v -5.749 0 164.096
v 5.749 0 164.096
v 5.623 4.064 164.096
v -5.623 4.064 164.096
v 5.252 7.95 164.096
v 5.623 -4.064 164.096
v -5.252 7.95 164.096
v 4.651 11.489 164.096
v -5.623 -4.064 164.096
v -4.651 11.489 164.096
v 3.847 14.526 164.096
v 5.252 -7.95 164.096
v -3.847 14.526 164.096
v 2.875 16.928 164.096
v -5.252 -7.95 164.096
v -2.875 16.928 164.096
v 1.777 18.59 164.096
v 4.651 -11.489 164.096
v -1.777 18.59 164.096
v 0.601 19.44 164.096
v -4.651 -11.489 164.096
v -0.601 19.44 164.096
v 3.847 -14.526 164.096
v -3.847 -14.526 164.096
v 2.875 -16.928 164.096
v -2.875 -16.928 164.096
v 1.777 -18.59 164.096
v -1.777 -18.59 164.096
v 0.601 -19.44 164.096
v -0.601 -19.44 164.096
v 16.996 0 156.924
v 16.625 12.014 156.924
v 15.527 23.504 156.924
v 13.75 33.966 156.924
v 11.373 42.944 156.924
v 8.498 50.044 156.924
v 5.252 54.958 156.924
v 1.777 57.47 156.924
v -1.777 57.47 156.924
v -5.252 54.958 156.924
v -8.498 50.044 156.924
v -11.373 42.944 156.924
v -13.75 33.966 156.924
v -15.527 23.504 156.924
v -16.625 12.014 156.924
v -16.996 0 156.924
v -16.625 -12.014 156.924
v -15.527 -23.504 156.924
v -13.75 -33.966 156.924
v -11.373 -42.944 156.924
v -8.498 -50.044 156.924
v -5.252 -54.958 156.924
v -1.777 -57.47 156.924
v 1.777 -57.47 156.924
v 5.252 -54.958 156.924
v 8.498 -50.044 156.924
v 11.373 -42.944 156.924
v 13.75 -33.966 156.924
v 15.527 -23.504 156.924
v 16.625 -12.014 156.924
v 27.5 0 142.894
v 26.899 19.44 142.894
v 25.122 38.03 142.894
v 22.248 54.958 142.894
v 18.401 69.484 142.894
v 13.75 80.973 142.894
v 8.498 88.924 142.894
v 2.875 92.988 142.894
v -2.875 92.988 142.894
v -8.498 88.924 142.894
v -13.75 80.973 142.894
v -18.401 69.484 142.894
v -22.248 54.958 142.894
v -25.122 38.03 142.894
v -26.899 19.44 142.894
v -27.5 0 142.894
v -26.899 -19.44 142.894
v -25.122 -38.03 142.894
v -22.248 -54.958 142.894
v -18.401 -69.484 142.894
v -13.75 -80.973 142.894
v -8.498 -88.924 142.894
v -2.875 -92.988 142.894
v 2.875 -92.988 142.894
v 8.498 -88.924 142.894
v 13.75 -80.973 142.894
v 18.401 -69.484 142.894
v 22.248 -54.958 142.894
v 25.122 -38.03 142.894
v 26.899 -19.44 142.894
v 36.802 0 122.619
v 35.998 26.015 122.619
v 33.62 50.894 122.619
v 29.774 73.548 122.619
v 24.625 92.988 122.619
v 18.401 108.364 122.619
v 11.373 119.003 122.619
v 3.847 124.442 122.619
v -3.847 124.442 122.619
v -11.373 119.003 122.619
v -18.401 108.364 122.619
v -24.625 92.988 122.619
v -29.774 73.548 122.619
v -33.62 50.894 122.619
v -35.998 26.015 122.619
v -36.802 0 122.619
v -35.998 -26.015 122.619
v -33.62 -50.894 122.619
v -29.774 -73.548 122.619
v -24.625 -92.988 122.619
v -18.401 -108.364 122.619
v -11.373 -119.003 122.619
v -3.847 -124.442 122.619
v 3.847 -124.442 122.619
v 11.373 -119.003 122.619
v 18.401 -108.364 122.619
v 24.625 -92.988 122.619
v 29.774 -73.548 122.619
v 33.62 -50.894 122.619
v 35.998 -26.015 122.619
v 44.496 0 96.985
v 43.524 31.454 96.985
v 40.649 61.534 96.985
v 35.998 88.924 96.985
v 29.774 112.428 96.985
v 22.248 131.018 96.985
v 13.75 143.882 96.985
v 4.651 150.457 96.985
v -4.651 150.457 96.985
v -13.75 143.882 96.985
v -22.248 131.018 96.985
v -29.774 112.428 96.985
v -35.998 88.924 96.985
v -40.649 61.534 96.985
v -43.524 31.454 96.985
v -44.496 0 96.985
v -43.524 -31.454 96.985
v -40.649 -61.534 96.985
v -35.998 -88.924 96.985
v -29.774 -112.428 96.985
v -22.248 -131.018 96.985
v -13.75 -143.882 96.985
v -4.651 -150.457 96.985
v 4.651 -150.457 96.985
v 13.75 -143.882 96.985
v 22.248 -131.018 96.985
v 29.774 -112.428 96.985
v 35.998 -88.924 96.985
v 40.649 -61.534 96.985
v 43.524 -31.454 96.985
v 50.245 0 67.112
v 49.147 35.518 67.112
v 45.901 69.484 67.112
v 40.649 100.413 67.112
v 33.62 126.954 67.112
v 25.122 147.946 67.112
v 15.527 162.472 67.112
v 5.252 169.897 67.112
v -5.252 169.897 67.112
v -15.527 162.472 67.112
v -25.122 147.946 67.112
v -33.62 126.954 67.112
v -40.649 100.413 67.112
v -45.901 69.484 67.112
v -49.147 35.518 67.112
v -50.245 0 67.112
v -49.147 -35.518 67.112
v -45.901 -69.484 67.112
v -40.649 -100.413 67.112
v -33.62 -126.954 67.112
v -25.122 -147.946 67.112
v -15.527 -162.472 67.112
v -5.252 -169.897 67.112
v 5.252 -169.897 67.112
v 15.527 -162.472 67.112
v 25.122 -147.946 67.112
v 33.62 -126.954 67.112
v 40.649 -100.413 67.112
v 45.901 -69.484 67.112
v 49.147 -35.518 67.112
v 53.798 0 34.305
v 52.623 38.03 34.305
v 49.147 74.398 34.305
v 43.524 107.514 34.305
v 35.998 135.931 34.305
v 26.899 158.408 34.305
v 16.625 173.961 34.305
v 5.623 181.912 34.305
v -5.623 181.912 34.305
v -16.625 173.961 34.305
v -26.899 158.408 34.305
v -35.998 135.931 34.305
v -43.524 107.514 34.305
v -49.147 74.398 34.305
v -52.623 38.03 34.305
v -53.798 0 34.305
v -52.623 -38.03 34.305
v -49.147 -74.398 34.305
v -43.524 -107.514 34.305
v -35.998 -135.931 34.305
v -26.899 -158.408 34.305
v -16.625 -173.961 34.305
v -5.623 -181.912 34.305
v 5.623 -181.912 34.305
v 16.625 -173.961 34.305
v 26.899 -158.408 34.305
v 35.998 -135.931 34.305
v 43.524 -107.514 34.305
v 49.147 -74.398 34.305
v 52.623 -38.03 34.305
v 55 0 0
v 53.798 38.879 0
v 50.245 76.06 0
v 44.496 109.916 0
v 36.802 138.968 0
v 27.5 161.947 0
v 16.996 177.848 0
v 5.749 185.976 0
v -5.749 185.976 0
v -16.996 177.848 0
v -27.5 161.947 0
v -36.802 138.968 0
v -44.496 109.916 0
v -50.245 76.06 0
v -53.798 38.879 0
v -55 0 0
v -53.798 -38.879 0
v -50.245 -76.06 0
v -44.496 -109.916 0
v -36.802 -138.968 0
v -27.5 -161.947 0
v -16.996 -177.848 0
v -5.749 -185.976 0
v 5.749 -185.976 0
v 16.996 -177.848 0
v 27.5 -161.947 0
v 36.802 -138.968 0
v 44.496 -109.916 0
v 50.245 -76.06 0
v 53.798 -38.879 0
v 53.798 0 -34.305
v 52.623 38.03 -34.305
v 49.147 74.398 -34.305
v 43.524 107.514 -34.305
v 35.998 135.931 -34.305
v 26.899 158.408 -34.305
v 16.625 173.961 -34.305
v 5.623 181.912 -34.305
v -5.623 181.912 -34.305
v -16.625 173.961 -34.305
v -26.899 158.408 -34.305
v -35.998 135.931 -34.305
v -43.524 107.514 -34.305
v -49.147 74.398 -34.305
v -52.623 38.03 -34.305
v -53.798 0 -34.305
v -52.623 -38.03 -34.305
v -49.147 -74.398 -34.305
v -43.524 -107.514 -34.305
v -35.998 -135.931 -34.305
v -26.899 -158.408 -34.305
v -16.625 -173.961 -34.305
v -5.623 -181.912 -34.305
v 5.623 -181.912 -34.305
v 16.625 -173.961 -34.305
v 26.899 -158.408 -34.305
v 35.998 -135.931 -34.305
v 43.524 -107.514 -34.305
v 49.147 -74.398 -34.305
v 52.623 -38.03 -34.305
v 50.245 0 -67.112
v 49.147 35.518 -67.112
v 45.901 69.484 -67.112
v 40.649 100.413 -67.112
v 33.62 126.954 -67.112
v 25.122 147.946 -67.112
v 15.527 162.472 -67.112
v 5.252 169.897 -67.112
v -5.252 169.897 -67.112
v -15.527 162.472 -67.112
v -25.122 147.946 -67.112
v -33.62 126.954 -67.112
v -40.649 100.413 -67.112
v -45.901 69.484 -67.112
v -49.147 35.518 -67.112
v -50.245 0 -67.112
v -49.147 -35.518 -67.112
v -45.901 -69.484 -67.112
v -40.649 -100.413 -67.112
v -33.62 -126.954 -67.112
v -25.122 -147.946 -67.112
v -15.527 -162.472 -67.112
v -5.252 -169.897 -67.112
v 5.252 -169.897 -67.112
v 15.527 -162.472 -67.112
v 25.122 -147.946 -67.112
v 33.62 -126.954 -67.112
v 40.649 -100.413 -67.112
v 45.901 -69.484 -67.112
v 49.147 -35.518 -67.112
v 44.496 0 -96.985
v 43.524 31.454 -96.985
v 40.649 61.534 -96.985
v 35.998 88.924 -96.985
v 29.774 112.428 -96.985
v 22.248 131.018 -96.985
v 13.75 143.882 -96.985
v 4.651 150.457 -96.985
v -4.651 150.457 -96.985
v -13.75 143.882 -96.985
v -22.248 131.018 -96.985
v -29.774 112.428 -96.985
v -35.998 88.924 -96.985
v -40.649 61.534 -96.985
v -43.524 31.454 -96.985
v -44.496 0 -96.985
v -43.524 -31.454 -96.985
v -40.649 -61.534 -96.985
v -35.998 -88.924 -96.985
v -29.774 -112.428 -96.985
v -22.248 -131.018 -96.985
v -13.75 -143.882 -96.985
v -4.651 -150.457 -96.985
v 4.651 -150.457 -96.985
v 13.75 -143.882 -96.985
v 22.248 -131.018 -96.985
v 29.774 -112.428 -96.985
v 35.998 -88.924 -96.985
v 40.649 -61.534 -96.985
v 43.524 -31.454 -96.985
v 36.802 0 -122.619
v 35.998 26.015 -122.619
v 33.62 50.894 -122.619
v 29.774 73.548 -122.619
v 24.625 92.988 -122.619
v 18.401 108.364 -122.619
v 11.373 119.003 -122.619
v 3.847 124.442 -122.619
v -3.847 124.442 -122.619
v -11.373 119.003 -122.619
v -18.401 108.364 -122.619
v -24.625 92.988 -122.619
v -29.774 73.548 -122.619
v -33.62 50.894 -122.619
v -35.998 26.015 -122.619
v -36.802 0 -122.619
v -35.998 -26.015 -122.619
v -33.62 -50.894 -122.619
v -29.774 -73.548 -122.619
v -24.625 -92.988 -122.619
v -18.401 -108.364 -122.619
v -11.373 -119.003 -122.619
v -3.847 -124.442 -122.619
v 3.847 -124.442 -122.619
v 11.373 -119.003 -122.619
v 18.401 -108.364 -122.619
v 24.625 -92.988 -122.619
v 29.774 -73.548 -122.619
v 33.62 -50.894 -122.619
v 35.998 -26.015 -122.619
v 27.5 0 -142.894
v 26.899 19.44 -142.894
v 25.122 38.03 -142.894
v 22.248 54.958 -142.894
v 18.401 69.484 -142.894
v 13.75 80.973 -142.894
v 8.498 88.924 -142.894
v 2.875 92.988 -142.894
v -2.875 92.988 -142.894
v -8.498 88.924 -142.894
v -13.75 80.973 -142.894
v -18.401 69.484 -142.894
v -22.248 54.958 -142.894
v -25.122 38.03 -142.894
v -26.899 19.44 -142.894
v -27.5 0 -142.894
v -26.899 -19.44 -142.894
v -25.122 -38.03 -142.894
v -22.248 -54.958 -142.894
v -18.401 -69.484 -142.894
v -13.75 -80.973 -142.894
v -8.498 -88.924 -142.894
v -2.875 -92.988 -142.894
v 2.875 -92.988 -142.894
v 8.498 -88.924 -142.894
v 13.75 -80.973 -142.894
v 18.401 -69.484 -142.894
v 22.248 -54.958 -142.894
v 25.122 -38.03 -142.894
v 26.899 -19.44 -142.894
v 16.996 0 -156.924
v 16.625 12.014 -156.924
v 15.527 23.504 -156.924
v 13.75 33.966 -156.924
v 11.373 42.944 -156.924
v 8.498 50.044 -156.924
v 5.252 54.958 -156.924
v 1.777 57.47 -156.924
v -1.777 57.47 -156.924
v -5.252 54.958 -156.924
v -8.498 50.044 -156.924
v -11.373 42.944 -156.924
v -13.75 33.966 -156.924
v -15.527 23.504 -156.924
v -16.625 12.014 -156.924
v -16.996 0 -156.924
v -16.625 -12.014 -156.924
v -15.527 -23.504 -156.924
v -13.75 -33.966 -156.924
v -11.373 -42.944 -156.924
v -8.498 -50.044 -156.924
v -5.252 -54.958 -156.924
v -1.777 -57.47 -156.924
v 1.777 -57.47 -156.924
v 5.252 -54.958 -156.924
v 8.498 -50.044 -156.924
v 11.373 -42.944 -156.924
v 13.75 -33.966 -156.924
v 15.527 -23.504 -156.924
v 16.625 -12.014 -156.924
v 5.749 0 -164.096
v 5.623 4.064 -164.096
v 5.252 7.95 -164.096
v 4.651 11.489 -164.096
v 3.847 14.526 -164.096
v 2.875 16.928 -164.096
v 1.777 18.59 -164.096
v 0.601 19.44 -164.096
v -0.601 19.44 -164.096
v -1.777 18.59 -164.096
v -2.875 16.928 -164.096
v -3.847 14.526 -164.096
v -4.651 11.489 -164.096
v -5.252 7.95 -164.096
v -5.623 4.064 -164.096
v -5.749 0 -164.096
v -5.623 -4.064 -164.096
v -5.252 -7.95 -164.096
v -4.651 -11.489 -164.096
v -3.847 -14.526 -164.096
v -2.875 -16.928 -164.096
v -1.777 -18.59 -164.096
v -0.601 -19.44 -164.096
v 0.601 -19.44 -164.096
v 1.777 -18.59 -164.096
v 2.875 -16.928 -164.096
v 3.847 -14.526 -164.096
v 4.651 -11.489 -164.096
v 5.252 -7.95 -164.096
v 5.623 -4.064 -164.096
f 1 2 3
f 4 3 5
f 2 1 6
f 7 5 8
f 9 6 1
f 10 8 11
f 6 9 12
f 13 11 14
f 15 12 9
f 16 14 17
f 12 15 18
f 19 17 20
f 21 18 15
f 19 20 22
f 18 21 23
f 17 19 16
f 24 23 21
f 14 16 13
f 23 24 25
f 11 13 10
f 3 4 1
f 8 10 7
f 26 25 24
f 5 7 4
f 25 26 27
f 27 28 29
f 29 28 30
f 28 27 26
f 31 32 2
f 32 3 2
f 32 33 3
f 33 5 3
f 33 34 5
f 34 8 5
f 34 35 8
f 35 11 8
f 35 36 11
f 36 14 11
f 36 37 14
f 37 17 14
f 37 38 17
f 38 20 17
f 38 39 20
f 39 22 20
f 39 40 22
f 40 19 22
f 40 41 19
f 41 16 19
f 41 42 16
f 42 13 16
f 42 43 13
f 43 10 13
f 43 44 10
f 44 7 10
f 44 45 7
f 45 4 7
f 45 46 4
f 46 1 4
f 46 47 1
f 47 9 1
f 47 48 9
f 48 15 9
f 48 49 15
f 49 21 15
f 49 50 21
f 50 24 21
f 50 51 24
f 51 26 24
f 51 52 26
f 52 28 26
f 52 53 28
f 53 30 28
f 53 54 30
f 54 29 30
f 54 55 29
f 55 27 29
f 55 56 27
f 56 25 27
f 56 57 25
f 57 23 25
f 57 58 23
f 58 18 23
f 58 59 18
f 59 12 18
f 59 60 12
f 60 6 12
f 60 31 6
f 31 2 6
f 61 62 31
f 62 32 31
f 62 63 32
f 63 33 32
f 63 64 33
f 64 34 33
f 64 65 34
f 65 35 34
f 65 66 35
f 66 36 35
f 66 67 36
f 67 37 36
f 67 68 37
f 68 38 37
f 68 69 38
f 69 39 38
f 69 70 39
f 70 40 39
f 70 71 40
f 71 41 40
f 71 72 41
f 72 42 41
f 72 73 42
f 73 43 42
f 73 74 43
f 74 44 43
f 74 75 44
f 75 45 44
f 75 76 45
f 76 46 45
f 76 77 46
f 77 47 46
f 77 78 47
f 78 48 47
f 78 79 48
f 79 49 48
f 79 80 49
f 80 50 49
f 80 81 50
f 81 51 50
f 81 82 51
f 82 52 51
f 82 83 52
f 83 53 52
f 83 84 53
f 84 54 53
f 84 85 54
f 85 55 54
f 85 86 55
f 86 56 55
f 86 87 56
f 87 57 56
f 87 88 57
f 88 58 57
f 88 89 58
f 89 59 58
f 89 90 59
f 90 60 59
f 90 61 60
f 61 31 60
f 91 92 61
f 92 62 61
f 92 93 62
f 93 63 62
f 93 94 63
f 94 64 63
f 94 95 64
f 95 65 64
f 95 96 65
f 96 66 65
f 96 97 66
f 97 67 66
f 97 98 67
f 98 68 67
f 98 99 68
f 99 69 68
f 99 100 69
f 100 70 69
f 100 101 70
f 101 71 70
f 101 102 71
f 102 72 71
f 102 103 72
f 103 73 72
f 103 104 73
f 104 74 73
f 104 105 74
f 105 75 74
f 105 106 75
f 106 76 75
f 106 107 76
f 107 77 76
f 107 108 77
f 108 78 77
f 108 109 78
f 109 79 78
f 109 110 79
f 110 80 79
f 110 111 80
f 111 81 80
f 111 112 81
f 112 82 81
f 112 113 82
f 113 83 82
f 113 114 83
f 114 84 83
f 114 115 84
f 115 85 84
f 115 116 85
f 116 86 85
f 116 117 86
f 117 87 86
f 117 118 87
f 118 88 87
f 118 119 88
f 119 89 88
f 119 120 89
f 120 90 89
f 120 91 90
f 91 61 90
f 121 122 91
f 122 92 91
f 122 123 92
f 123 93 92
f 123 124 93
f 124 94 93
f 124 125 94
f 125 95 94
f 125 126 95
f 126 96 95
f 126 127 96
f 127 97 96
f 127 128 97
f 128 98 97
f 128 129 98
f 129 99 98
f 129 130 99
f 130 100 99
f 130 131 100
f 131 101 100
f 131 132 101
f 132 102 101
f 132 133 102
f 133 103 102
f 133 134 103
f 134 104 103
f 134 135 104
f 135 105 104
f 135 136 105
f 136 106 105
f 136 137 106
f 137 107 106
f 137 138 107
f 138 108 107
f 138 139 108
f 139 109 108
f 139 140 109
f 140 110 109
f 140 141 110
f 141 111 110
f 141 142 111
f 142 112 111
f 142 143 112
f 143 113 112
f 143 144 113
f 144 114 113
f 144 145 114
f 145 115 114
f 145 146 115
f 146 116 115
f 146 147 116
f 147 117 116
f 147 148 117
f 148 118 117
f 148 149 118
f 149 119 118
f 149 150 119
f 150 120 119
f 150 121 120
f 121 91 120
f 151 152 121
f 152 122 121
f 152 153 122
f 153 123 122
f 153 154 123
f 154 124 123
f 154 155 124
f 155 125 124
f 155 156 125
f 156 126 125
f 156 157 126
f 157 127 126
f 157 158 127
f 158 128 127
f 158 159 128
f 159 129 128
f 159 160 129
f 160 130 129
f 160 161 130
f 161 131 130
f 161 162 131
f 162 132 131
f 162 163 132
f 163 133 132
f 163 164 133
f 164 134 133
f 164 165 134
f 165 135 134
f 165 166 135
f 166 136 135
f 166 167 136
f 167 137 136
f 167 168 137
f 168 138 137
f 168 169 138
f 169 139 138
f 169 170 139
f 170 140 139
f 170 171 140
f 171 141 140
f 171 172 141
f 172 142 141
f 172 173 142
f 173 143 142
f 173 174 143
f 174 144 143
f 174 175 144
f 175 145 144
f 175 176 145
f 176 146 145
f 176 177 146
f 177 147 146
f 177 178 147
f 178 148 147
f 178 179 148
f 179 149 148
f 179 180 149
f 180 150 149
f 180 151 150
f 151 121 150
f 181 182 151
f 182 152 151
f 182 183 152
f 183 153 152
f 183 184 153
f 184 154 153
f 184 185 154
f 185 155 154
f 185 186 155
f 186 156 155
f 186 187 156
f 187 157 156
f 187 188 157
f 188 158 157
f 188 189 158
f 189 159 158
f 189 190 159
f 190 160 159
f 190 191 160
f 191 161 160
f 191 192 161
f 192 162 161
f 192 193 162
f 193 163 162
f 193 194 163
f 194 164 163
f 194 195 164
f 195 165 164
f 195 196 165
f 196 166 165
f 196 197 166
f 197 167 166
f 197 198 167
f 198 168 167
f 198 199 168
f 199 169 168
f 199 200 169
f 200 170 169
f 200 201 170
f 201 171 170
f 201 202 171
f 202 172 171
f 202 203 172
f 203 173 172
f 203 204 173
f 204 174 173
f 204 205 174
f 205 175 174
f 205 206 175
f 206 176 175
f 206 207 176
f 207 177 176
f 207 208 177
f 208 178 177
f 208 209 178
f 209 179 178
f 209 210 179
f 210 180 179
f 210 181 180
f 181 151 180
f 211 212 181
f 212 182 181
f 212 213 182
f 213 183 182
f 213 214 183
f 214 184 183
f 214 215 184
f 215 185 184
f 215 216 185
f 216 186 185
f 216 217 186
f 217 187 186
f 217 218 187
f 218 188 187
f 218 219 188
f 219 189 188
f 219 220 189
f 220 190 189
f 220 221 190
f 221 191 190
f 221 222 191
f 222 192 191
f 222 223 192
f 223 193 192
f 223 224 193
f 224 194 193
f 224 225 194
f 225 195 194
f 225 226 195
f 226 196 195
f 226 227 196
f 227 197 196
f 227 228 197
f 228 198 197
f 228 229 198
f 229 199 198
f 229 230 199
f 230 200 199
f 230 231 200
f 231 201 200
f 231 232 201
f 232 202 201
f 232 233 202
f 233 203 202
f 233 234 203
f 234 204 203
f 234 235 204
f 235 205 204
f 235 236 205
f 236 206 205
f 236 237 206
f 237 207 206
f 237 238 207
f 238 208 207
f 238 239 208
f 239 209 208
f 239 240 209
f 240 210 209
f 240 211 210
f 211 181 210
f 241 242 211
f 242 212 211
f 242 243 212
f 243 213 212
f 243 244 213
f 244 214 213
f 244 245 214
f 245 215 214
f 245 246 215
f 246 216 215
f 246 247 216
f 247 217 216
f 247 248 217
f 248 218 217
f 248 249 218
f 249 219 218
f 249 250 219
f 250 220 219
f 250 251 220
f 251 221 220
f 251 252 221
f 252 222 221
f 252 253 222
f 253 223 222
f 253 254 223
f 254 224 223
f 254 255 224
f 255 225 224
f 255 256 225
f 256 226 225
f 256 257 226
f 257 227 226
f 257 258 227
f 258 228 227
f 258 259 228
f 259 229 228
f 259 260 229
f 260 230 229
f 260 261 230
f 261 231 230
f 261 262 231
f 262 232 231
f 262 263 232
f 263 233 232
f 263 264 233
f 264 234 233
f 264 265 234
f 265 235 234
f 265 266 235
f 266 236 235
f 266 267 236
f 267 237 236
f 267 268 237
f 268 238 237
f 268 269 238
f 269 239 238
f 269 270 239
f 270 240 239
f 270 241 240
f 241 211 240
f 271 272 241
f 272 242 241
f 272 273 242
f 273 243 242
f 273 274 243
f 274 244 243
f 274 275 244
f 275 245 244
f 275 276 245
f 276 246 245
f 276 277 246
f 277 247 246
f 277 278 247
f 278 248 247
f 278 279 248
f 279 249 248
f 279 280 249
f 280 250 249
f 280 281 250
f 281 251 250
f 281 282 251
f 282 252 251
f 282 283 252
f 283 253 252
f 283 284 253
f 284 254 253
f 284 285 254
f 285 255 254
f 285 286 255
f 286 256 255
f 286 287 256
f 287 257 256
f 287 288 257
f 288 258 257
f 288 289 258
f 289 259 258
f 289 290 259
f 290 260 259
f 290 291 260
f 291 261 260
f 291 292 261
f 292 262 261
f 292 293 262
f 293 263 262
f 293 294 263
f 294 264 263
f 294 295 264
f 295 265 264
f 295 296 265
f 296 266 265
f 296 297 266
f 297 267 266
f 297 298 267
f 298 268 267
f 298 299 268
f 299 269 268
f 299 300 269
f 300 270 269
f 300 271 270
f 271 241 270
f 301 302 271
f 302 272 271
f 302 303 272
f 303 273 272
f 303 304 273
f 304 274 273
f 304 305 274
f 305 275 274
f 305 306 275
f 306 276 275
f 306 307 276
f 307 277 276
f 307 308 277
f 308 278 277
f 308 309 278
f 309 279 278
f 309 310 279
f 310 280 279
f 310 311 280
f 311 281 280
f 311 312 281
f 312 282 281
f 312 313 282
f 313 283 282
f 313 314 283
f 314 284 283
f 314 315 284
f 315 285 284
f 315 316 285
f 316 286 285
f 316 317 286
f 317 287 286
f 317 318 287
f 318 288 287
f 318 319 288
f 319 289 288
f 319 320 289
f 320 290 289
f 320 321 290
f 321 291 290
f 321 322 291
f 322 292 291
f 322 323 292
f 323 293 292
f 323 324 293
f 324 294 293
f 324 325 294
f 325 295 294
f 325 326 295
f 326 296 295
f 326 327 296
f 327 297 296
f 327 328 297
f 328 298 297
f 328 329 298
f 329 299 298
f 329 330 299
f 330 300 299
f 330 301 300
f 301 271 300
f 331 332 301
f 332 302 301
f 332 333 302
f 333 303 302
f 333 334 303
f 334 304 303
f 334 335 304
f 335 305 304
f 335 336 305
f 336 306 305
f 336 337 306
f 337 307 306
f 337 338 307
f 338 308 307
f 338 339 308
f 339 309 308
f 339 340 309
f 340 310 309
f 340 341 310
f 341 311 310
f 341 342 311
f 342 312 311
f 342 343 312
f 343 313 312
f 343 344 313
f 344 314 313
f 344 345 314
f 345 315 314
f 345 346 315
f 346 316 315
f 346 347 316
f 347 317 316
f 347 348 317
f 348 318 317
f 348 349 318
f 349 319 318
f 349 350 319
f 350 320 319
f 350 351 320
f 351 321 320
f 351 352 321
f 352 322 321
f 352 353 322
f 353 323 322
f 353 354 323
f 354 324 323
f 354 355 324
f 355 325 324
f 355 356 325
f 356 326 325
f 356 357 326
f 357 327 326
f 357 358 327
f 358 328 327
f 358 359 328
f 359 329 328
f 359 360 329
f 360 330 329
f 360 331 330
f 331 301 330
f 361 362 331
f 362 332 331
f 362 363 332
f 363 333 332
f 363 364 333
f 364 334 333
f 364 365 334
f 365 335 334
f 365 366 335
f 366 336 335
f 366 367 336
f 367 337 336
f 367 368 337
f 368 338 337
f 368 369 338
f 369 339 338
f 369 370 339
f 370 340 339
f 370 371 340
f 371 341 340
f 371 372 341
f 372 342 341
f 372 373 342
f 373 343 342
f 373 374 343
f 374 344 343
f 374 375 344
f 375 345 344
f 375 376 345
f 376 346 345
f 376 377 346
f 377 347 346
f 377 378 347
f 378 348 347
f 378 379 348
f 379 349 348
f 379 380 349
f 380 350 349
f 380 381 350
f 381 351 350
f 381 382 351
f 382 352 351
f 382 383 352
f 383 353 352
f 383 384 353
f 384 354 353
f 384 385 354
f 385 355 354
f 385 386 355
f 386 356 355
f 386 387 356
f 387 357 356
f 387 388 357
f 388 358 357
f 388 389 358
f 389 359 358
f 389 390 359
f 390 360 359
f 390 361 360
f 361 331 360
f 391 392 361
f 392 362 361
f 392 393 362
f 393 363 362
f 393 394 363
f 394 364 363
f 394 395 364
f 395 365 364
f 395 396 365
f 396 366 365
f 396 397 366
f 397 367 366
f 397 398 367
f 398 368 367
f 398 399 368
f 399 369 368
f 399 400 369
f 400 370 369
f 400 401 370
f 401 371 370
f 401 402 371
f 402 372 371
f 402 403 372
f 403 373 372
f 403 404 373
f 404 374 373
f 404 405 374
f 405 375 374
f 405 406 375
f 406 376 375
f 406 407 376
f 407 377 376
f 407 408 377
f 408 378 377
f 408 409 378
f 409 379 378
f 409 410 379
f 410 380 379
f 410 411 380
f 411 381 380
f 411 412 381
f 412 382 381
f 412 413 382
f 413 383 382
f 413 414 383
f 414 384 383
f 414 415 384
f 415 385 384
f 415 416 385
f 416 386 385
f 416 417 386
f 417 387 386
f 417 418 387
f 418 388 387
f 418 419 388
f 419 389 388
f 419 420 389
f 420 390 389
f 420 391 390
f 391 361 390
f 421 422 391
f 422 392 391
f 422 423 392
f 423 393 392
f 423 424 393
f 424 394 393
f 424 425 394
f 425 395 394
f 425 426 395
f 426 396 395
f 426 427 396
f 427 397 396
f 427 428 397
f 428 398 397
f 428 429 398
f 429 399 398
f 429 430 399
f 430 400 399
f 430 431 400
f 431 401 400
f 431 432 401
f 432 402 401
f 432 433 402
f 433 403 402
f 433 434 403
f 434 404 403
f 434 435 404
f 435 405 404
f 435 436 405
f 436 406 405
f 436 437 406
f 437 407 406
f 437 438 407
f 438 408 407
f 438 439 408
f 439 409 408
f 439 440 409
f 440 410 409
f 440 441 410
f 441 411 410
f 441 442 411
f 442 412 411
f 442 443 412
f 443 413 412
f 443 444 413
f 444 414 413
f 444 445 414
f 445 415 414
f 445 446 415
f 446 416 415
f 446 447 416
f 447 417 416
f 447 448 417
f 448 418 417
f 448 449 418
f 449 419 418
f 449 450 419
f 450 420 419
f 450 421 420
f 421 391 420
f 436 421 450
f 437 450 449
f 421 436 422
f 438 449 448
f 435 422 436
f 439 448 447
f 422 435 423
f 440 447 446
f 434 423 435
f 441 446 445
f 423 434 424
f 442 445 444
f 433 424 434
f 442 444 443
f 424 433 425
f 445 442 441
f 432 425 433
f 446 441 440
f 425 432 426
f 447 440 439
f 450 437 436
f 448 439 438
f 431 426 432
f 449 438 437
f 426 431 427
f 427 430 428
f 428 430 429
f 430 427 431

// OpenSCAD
// Generated by SolidPython 1.0.1 on 2020-07-29 00:46:47


scale(v = [5, 17, 15]) {
	sphere(r = 11);
}
/***********************************************
*********      SolidPython code:      **********
************************************************
 
# import packages: SolidPython
from solid import *
from solid.utils import *
from itertools import chain, combinations, permutations


class Resize:

    def __init__(self, scad_file):
        self.scad_file = scad_file
        #self.scad_file = import_scad(scad_file)
        # cone/cylinder param:
        self.r1 = 0
        self.r2 = 0
        self.h = 0
        # rectangular prism param:
        self.w = 0
        self.l = 0
        # ellipse param:
        self.r = 0

    # import OpenScad code (file name corresponds to shape)


    # classify shape + parameters
    def assign(self, param1, param2, param3):
        if self.scad_file == 'cone.scad':
            self.r1 = param1
            self.r2 = param2
            self.h = param3
        elif self.scad_file == 'cylinder.scad':
            self.r1 = param1
            self.r2 = param2
            self.h = param3
        elif self.scad_file == 'rectangularPrism.scad':
            self.h = param1
            self.l = param2
            self.w = param3
        else:
            self.r = param1
            self.h = param2

    # resize parameters
    def iterate(self):
        x = range(3, 20, 2)
        i = 1
        if self.scad_file == 'cone.scad':
            tempList = list(permutations(x, 2))
            for temp in tempList:
                param1 = temp[0]
                param2 = temp[1]
                filepath = 'produced_scad_files/' + 'cone' + str(param1) + '_' + str(param2) + '_' + '.scad'
                scad_render_to_file(cylinder(h=param1, r1=param2, r2=0), filepath)

        elif self.scad_file == 'cylinder.scad':
            tempList = list(permutations(x, 3))
            for temp in tempList:
                param1 = temp[0]
                param2 = temp[1]
                filepath = 'produced_scad_files/' + 'cylinder' + str(param1) + '_' + str(param2) + '_' + '.scad'
                scad_render_to_file(cylinder(h=param1, r1=param2, r2=param2), filepath)

        elif self.scad_file == 'rectangularPrism.scad':
            tempList = list(permutations(x, 3))
            for temp in tempList:
                param1 = temp[0]
                param2 = temp[1]
                param3 = temp[2]
                filepath = 'produced_scad_files/' + 'rectangularPrism' + str(param1) + '_' + str(param2) + '_' + str(
                    param3) + '.scad'
                scad_render_to_file(cube(size=(param1, param2, param3)), filepath)

        elif self.scad_file == 'ellipse.scad':
            tempList = list(permutations(x, 4))
            for temp in tempList:
                param1 = temp[0]
                param2 = temp[1]
                param3 = temp[2]
                param4 = temp[3]
                filepath = 'produced_scad_files/' + 'ellipse' + str(param1) + '_' + str(param2) + '_' + str(param3) + '_' + str(param4) + '.scad'
                scad_render_to_file(scale([param1, param2, param3])(sphere(r=param4)), filepath)

    def render_to_scadfile(self):
        scad_render_to_file(scad, 'example.scad') 
 
************************************************/
